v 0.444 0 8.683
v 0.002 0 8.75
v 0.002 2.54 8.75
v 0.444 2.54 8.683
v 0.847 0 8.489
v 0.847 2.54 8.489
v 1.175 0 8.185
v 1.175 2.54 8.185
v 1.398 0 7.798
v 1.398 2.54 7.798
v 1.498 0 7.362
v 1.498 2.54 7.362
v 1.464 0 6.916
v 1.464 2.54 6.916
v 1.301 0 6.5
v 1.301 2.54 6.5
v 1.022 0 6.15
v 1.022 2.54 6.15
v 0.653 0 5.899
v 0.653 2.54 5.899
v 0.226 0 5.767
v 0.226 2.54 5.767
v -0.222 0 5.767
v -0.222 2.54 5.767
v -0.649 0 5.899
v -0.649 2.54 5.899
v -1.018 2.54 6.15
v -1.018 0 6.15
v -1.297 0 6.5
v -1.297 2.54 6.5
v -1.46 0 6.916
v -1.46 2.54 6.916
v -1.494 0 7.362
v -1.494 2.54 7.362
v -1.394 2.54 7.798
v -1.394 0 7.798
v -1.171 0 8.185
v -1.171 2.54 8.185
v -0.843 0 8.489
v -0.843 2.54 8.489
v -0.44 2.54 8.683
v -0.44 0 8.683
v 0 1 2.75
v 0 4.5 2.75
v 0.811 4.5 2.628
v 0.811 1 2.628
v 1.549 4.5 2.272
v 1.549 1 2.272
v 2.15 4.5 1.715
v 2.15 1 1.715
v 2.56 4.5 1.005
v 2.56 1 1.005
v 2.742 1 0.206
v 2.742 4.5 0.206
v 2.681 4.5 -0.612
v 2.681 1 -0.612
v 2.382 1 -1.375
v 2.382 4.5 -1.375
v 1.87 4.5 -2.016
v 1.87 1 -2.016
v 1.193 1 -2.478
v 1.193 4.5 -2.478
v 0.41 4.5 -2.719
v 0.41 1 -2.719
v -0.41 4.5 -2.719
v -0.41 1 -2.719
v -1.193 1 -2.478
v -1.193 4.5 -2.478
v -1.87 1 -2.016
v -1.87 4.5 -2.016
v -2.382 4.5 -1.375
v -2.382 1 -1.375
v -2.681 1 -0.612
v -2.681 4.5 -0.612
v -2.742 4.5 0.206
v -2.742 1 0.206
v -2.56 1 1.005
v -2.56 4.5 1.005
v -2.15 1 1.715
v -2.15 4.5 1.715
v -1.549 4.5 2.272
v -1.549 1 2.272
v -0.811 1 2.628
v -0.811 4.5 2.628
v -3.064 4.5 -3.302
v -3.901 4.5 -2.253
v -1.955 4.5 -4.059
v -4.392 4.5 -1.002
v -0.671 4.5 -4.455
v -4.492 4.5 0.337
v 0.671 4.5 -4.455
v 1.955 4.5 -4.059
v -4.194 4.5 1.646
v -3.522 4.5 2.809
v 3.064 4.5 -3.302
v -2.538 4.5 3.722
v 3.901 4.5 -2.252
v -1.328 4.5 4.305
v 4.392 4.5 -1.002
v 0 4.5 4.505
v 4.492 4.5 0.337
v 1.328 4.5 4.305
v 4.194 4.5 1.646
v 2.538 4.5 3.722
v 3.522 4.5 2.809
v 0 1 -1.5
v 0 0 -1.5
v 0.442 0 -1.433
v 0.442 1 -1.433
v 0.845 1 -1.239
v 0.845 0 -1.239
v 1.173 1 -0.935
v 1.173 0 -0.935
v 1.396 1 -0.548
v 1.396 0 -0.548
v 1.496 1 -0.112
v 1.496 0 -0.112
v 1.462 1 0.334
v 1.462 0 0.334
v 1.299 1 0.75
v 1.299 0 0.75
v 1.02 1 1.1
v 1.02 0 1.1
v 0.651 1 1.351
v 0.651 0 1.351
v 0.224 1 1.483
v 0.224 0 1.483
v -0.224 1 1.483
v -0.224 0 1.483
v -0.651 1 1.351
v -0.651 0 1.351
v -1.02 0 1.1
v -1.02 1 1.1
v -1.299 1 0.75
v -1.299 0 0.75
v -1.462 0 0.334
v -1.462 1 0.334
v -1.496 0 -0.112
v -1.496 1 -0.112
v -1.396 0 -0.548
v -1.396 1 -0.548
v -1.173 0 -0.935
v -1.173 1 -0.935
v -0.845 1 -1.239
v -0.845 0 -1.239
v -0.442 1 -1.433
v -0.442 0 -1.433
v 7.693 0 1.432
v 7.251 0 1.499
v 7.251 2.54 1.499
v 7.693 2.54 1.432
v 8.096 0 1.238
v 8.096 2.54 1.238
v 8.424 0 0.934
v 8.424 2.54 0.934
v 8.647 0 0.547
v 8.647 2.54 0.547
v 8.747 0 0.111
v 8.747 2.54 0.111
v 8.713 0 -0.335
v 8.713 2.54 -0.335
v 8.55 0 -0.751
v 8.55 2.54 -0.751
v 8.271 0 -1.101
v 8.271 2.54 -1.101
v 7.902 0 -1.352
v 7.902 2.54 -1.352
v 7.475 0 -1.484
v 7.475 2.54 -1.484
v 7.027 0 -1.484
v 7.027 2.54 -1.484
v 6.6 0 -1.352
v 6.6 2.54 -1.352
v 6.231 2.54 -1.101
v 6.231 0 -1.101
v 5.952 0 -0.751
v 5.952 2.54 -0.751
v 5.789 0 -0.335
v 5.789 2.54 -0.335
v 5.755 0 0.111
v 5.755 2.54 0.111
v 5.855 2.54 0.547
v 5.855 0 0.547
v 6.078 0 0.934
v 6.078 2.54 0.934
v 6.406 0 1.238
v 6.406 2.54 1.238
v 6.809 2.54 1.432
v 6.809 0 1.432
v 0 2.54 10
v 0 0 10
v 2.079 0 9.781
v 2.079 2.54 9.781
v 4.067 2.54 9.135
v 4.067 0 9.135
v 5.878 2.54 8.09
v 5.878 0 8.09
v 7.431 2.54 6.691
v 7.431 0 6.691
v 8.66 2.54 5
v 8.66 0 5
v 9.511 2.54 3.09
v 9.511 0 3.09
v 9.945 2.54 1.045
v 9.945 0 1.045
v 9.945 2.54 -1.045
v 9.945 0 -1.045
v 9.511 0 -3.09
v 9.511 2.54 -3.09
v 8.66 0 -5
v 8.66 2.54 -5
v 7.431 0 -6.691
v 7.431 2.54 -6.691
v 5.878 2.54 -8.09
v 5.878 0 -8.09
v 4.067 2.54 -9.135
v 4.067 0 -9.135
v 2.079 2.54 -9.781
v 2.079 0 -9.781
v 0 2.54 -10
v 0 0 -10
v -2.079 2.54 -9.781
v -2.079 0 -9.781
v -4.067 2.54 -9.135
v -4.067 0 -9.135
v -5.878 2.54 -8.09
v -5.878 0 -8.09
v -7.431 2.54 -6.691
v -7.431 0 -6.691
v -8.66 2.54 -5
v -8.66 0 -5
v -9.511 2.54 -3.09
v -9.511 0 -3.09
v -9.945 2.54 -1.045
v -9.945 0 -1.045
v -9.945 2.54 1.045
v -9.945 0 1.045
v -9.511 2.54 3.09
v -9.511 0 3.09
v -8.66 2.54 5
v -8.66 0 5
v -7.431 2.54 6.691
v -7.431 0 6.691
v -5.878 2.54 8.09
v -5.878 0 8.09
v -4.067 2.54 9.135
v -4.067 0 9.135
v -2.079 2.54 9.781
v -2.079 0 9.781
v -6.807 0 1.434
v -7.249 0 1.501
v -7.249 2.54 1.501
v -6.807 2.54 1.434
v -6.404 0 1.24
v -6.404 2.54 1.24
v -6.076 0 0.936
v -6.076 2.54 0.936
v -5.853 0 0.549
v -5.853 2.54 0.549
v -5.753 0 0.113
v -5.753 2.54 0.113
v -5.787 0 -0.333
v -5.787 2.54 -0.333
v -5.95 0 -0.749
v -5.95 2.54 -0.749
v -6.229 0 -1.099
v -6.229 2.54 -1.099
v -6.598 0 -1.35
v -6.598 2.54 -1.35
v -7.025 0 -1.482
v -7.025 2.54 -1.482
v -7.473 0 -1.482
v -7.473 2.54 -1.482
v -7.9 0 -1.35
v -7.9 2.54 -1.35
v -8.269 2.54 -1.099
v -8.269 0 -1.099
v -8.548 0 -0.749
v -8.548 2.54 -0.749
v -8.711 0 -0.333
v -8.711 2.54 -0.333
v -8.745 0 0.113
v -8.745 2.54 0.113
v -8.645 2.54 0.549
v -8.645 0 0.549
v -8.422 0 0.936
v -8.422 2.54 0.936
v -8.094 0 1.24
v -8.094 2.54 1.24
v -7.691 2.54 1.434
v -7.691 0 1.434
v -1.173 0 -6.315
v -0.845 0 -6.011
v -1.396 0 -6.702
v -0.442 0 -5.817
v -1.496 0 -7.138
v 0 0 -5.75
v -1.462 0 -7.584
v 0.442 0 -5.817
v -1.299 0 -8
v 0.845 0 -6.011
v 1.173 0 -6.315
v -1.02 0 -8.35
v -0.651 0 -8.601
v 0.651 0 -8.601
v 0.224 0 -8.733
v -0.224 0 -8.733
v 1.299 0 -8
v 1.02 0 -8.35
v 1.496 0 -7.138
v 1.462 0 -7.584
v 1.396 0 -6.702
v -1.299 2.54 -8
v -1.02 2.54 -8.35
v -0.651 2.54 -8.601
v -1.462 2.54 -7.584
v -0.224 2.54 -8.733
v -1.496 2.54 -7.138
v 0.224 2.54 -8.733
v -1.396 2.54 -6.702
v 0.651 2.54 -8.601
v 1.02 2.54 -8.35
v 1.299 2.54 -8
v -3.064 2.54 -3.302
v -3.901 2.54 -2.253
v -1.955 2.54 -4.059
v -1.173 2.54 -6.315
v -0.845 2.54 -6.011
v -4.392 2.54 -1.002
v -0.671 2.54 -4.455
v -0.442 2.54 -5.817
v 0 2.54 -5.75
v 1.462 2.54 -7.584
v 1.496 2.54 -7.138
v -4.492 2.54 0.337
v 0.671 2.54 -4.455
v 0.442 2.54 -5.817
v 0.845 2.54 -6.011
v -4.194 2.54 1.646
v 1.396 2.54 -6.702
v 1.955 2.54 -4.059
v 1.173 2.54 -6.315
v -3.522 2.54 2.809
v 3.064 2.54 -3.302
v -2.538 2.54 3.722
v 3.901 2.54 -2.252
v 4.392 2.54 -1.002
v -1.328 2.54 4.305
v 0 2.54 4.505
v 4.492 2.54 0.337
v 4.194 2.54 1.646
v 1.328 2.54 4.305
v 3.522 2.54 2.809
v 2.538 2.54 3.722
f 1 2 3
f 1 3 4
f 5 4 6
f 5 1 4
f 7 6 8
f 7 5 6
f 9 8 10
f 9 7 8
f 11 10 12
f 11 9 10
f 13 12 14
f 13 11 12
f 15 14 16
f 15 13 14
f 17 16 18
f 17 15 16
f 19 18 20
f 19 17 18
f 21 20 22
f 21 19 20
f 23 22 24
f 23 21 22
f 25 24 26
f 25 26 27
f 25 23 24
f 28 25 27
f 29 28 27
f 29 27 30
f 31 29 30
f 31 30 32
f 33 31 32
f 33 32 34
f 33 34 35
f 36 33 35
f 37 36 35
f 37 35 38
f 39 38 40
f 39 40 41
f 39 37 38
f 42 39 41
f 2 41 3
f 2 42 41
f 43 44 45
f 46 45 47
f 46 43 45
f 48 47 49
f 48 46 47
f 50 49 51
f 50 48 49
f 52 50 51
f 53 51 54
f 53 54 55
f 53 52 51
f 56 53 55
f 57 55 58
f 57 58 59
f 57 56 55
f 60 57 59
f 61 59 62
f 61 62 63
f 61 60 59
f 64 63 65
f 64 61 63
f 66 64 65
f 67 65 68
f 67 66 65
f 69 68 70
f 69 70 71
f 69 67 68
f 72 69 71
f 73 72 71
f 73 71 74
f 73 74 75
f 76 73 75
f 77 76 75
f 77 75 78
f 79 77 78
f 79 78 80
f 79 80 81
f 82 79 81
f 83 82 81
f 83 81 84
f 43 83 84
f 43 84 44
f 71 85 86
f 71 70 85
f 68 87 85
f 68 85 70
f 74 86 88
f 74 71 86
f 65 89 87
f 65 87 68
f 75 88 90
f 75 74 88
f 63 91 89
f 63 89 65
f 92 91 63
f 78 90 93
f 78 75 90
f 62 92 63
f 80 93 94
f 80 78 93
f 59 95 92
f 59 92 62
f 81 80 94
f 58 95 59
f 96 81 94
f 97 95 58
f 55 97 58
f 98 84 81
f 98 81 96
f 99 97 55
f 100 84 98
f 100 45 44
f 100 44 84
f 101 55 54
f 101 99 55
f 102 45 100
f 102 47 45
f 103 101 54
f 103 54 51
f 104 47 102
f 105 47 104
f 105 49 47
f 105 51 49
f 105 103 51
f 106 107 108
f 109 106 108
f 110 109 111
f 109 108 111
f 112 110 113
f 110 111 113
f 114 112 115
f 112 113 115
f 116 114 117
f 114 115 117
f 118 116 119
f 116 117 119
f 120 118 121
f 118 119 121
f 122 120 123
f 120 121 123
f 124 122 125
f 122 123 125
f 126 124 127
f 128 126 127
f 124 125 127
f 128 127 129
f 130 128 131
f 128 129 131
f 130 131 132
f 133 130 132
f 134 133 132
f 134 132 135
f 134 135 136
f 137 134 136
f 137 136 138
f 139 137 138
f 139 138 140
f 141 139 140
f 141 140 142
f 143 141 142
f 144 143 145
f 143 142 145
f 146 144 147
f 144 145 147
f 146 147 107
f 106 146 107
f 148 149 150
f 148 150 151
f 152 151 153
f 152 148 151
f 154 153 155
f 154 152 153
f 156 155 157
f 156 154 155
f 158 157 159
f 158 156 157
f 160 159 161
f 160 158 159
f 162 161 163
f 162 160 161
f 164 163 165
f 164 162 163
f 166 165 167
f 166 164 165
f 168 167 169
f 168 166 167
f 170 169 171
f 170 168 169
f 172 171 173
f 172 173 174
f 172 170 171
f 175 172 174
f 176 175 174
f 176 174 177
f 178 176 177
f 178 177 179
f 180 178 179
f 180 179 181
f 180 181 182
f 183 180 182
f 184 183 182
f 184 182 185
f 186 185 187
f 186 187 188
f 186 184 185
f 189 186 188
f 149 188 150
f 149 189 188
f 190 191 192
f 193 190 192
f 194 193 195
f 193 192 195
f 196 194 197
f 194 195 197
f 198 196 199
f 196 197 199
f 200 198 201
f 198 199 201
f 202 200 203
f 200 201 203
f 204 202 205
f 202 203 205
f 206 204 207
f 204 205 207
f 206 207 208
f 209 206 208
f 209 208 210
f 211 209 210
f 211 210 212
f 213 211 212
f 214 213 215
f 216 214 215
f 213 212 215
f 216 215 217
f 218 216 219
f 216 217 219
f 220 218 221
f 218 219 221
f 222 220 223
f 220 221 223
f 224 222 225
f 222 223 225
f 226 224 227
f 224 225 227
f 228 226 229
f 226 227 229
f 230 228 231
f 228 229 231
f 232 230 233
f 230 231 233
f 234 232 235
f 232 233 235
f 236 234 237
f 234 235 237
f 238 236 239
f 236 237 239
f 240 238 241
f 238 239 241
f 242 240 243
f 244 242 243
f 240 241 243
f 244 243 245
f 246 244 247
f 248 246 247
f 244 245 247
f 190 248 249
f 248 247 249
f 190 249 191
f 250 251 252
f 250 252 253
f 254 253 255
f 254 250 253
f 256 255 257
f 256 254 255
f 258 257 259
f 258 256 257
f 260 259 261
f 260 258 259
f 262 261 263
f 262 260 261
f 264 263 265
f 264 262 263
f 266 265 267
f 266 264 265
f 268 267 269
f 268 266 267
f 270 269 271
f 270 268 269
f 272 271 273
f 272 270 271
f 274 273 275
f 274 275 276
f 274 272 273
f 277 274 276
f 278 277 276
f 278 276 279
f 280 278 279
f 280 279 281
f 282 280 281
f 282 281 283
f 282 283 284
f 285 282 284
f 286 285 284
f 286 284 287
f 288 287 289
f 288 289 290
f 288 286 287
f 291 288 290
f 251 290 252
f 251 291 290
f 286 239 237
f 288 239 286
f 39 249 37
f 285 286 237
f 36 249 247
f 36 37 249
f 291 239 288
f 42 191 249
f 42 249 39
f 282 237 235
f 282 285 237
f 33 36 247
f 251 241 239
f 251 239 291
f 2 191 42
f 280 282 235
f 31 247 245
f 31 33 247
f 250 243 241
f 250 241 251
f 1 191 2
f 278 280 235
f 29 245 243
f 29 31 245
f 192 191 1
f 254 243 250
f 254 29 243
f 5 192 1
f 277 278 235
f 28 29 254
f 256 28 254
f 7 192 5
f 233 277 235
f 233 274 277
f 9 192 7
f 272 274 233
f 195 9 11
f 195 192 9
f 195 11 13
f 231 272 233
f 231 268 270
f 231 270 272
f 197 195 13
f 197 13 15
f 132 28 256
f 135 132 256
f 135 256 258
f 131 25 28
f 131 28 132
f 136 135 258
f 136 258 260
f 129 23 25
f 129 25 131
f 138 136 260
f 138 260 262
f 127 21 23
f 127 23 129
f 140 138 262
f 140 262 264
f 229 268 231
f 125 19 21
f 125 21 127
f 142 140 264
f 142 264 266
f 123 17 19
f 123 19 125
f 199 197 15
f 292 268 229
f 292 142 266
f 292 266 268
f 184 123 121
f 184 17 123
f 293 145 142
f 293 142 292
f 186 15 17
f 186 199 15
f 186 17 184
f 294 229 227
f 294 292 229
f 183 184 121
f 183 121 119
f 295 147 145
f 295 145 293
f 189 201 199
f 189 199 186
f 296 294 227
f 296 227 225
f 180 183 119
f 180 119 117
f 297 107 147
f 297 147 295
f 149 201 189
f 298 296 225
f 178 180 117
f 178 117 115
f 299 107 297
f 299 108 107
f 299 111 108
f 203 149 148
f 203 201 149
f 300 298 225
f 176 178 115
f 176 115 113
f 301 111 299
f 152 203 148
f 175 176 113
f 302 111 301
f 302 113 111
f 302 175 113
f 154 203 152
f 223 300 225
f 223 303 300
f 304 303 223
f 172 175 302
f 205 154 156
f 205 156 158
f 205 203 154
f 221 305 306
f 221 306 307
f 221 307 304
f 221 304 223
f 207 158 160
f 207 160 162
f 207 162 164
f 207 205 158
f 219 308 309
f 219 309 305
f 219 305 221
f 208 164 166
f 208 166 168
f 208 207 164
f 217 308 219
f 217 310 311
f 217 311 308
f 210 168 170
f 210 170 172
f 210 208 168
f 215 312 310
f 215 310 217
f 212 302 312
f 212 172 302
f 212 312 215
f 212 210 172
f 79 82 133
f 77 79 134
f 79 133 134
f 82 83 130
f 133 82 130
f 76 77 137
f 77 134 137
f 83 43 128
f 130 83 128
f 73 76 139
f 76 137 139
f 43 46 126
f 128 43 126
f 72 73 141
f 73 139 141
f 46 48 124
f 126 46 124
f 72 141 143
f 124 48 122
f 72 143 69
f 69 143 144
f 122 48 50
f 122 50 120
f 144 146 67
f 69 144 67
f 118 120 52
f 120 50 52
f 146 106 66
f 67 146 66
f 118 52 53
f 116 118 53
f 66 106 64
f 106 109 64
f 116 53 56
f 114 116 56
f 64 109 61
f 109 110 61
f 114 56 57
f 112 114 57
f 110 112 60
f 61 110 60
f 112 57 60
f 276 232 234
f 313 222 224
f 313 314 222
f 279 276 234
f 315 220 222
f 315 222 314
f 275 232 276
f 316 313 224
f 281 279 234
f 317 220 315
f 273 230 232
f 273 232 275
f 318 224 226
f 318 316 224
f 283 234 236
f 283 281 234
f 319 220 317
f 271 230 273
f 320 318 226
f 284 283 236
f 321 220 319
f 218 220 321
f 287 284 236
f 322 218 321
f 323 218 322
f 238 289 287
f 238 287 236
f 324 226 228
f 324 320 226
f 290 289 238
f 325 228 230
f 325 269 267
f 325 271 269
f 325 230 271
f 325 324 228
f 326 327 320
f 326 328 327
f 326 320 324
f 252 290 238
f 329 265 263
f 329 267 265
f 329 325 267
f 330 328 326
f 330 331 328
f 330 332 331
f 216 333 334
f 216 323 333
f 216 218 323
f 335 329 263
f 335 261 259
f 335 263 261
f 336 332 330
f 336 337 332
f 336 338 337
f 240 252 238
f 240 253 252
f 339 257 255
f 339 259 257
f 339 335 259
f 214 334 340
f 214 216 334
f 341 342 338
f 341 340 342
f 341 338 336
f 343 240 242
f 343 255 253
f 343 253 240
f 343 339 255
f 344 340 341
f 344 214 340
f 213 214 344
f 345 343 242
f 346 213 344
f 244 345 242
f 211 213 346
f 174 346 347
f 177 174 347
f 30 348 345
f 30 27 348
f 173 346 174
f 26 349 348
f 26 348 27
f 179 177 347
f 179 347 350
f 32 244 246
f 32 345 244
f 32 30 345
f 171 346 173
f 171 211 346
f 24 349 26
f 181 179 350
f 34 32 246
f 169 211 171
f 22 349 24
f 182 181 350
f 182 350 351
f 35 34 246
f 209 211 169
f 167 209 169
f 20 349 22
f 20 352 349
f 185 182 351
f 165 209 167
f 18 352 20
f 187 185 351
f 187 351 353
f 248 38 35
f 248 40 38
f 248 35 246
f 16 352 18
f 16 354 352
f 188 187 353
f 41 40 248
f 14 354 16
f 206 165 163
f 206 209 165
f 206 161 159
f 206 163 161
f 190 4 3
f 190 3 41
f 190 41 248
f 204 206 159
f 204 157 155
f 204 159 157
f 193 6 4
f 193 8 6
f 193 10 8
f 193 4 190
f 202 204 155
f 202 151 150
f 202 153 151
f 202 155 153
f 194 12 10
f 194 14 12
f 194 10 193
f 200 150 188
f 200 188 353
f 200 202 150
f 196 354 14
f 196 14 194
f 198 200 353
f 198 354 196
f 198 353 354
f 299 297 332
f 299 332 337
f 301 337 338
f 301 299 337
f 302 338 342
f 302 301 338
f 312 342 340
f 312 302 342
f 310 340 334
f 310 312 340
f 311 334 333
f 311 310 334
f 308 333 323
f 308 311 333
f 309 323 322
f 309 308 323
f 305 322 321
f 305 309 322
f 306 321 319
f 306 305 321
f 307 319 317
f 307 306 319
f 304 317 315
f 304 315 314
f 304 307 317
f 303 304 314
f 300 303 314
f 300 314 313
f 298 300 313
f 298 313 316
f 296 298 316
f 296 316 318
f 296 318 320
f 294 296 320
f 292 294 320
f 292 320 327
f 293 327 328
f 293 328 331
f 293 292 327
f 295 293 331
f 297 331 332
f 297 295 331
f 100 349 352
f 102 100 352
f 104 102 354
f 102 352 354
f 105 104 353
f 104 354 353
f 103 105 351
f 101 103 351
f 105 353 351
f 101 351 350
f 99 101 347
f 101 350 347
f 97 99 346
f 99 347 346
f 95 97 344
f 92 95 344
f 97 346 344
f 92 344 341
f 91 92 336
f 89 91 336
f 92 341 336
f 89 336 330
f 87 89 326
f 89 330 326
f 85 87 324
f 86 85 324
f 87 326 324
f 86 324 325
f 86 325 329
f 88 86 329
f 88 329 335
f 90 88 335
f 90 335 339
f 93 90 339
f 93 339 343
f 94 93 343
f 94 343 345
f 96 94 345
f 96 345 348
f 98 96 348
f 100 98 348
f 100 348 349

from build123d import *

# Parameters (mm, degrees)
SKETCH_2_R          = 10
SKETCH_2_R_2        = 4.505
EXTRUDE_1_DEPTH     = 2.54
SKETCH_3_R          = 4.505
SKETCH_3_R_2        = 2.75
EXTRUDE_2_DEPTH     = 4.5
SKETCH_5_R          = 1.5
CUT_EXTRUDE_1_DEPTH = 2.54
SKETCH_6_R          = 2.75
SKETCH_6_R_2        = 1.5
EXTRUDE_3_DEPTH     = 1


with BuildPart() as part:
    # 草图2 → 凸台-拉伸1 (new body)
    with BuildSketch(Plane(origin=(0, 0, 0), x_dir=(1, 0, 0), z_dir=(0, 1, 0))):
        with Locations(Location((0, 0, 0), (0, 0, 270))):
            Circle(SKETCH_2_R)
        with Locations(Location((0, 0, 0), (0, 0, 270))):
            Circle(SKETCH_2_R_2, mode=Mode.SUBTRACT)
    extrude(amount=EXTRUDE_1_DEPTH)

    # 草图3 → 凸台-拉伸2 (add)
    with BuildSketch(Plane(origin=(0, 0, 0), x_dir=(1, 0, 0), z_dir=(0, 1, 0))):
        with Locations(Location((0, 0, 0), (0, 0, 270))):
            Circle(SKETCH_3_R)
        with Locations(Location((0, 0, 0), (0, 0, 270))):
            Circle(SKETCH_3_R_2, mode=Mode.SUBTRACT)
    extrude(amount=EXTRUDE_2_DEPTH)

    # 草图5 → 切除-拉伸1 (cut)
    with BuildSketch(Plane(origin=(0, 0, 0), x_dir=(1, 0, 0), z_dir=(0, 1, 0))):
        with Locations(Location((-7.249, -0.001, 0), (0, 0, 270))):
            Circle(SKETCH_5_R)
        with Locations(Location((0, 7.25, 0), (0, 0, 270))):
            Circle(SKETCH_5_R)
        with Locations(Location((7.251, 0.001, 0), (0, 0, 270))):
            Circle(SKETCH_5_R)
        with Locations(Location((0.002, -7.25, 0), (0, 0, 270))):
            Circle(SKETCH_5_R)
    extrude(amount=CUT_EXTRUDE_1_DEPTH, mode=Mode.SUBTRACT)

    # 草图6 → 凸台-拉伸3 (add)
    with BuildSketch(Plane(origin=(0, 0, 0), x_dir=(-1, 0, 0), z_dir=(0, -1, 0))):
        with Locations(Location((0, 0, 0), (0, 0, 90))):
            Circle(SKETCH_6_R)
        with Locations(Location((0, 0, 0), (0, 0, 90))):
            Circle(SKETCH_6_R_2, mode=Mode.SUBTRACT)
    extrude(amount=-EXTRUDE_3_DEPTH)


solid = part.part
